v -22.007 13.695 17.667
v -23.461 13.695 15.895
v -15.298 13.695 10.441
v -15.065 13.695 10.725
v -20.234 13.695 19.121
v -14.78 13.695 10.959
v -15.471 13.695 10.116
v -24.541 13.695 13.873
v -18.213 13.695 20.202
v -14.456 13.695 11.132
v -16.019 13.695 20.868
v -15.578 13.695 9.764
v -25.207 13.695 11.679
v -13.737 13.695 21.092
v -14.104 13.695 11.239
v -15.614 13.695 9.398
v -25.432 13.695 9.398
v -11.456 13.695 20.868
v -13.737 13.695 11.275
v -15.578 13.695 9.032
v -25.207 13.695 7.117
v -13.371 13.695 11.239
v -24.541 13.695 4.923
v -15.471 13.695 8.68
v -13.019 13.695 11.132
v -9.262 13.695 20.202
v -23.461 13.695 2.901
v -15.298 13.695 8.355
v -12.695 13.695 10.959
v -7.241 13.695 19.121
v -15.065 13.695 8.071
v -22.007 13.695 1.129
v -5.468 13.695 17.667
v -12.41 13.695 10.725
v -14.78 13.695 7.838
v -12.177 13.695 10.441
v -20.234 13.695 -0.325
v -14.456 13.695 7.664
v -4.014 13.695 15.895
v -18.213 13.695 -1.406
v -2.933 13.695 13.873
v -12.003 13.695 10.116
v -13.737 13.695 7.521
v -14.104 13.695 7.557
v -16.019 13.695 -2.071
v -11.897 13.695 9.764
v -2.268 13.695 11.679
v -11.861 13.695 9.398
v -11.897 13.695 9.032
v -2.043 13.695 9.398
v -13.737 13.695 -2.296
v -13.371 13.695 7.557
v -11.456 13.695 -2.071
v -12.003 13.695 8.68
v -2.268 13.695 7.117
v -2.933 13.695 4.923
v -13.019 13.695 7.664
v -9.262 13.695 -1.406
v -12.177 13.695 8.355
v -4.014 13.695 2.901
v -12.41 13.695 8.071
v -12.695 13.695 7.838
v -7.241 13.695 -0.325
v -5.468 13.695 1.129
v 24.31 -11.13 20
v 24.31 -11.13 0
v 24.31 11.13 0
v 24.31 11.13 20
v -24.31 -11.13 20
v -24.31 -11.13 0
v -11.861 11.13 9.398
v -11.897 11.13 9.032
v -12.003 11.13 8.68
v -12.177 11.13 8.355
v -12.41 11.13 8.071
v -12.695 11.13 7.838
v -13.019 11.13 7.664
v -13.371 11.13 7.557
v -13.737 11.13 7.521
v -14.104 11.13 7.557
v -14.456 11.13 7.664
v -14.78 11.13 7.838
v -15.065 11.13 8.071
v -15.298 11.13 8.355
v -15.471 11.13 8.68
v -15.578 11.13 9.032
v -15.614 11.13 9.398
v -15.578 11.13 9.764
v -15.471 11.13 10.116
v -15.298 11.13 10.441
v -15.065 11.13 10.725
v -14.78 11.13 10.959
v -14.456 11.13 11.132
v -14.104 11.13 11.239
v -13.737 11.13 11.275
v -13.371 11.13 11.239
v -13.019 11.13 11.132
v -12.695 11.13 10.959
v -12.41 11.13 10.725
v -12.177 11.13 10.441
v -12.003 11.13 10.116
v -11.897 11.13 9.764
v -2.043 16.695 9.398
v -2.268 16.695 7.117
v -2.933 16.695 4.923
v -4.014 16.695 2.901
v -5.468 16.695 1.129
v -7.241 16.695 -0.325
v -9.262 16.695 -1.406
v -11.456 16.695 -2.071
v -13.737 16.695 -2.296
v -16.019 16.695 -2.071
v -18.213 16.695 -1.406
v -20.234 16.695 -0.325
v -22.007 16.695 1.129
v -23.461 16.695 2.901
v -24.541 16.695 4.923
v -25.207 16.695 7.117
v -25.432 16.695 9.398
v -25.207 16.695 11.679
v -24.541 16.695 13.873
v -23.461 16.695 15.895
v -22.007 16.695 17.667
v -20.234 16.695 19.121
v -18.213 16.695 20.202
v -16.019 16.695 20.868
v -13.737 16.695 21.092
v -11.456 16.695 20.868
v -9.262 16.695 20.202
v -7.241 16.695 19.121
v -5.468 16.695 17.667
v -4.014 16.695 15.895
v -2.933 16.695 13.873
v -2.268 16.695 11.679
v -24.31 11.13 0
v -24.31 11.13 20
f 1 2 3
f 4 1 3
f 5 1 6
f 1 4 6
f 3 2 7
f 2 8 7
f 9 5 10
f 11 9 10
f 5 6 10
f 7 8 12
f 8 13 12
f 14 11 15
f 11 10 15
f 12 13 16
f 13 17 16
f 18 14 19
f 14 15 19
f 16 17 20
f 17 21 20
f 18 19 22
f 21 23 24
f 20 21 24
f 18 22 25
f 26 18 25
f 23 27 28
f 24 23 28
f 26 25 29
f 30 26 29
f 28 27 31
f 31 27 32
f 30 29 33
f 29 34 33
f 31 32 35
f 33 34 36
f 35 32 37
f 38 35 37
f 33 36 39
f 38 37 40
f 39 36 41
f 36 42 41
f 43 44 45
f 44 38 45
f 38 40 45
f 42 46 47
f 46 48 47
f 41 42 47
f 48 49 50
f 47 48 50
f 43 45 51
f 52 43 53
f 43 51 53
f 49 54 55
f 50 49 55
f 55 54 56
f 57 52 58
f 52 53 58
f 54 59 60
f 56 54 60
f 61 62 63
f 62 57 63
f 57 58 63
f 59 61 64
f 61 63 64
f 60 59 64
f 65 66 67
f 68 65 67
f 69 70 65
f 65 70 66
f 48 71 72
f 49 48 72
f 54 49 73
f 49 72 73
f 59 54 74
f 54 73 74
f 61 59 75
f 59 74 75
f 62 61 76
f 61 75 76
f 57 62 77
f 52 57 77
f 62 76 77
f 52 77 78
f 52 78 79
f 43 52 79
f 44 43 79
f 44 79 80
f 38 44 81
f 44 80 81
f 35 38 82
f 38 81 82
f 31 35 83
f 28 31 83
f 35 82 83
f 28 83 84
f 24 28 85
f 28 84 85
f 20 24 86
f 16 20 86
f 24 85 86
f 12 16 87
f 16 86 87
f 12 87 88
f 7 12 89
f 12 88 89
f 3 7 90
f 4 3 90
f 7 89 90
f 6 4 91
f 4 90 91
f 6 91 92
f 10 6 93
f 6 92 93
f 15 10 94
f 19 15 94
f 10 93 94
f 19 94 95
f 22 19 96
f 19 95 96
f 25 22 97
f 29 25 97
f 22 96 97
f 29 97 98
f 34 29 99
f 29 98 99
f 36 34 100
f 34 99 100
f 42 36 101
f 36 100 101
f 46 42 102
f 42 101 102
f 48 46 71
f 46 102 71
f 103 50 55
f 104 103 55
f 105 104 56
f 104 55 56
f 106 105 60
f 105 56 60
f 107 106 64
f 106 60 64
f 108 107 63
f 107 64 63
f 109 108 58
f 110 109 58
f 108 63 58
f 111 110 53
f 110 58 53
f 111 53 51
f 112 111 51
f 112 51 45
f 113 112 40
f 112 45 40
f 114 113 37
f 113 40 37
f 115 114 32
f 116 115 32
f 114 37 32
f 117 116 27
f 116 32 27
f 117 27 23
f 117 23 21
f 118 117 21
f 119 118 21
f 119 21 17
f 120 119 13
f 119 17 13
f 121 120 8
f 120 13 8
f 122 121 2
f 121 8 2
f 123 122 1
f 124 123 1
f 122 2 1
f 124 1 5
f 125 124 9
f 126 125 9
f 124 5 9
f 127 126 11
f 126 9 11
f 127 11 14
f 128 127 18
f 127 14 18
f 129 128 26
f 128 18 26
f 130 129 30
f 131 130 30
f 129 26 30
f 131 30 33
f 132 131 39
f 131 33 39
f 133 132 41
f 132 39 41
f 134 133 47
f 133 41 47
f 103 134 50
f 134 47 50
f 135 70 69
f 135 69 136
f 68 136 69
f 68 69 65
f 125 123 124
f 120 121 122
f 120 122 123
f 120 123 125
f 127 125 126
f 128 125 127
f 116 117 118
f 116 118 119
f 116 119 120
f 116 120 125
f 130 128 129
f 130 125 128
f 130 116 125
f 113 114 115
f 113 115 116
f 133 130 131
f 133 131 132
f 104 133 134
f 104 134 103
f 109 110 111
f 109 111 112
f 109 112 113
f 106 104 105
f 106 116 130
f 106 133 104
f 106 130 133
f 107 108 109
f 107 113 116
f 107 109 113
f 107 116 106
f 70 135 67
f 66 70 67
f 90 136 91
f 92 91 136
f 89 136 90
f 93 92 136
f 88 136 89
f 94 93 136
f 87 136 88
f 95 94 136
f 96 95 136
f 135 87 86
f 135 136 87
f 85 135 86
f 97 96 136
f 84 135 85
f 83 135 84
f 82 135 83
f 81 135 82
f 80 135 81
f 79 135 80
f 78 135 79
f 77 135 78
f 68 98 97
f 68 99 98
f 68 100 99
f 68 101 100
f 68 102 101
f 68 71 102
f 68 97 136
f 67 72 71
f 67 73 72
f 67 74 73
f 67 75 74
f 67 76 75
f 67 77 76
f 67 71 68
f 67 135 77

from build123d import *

# Parameters (mm, degrees)
SKETCH1_W           = 48.62
SKETCH1_H           = 22.26
BOSS_EXTRUDE1_DEPTH = 20
SKETCH2_R           = 1.876835713
BOSS_EXTRUDE2_DEPTH = 2.565394694
SKETCH3_R           = 11.694189136
BOSS_EXTRUDE3_DEPTH = 3


with BuildPart() as part:
    # Sketch1 → Boss-Extrude1 (new body)
    with BuildSketch(Plane.XY):
        Rectangle(SKETCH1_W, SKETCH1_H)
    extrude(amount=BOSS_EXTRUDE1_DEPTH)

    # Sketch2 → Boss-Extrude2 (add)
    with BuildSketch(Plane(origin=(0, 11.13, 0), x_dir=(1, 0, 0), z_dir=(0, 1, 0))):
        with Locations((-13.737467658, -9.398056281)):
            Circle(SKETCH2_R)
    extrude(amount=BOSS_EXTRUDE2_DEPTH)

    # Sketch3 → Boss-Extrude3 (add)
    with BuildSketch(Plane(origin=(0, 13.695394694, 0), x_dir=(1, 0, 0), z_dir=(0, 1, 0))):
        with Locations((-13.737467658, -9.398056281)):
            Circle(SKETCH3_R)
    extrude(amount=BOSS_EXTRUDE3_DEPTH)


solid = part.part
